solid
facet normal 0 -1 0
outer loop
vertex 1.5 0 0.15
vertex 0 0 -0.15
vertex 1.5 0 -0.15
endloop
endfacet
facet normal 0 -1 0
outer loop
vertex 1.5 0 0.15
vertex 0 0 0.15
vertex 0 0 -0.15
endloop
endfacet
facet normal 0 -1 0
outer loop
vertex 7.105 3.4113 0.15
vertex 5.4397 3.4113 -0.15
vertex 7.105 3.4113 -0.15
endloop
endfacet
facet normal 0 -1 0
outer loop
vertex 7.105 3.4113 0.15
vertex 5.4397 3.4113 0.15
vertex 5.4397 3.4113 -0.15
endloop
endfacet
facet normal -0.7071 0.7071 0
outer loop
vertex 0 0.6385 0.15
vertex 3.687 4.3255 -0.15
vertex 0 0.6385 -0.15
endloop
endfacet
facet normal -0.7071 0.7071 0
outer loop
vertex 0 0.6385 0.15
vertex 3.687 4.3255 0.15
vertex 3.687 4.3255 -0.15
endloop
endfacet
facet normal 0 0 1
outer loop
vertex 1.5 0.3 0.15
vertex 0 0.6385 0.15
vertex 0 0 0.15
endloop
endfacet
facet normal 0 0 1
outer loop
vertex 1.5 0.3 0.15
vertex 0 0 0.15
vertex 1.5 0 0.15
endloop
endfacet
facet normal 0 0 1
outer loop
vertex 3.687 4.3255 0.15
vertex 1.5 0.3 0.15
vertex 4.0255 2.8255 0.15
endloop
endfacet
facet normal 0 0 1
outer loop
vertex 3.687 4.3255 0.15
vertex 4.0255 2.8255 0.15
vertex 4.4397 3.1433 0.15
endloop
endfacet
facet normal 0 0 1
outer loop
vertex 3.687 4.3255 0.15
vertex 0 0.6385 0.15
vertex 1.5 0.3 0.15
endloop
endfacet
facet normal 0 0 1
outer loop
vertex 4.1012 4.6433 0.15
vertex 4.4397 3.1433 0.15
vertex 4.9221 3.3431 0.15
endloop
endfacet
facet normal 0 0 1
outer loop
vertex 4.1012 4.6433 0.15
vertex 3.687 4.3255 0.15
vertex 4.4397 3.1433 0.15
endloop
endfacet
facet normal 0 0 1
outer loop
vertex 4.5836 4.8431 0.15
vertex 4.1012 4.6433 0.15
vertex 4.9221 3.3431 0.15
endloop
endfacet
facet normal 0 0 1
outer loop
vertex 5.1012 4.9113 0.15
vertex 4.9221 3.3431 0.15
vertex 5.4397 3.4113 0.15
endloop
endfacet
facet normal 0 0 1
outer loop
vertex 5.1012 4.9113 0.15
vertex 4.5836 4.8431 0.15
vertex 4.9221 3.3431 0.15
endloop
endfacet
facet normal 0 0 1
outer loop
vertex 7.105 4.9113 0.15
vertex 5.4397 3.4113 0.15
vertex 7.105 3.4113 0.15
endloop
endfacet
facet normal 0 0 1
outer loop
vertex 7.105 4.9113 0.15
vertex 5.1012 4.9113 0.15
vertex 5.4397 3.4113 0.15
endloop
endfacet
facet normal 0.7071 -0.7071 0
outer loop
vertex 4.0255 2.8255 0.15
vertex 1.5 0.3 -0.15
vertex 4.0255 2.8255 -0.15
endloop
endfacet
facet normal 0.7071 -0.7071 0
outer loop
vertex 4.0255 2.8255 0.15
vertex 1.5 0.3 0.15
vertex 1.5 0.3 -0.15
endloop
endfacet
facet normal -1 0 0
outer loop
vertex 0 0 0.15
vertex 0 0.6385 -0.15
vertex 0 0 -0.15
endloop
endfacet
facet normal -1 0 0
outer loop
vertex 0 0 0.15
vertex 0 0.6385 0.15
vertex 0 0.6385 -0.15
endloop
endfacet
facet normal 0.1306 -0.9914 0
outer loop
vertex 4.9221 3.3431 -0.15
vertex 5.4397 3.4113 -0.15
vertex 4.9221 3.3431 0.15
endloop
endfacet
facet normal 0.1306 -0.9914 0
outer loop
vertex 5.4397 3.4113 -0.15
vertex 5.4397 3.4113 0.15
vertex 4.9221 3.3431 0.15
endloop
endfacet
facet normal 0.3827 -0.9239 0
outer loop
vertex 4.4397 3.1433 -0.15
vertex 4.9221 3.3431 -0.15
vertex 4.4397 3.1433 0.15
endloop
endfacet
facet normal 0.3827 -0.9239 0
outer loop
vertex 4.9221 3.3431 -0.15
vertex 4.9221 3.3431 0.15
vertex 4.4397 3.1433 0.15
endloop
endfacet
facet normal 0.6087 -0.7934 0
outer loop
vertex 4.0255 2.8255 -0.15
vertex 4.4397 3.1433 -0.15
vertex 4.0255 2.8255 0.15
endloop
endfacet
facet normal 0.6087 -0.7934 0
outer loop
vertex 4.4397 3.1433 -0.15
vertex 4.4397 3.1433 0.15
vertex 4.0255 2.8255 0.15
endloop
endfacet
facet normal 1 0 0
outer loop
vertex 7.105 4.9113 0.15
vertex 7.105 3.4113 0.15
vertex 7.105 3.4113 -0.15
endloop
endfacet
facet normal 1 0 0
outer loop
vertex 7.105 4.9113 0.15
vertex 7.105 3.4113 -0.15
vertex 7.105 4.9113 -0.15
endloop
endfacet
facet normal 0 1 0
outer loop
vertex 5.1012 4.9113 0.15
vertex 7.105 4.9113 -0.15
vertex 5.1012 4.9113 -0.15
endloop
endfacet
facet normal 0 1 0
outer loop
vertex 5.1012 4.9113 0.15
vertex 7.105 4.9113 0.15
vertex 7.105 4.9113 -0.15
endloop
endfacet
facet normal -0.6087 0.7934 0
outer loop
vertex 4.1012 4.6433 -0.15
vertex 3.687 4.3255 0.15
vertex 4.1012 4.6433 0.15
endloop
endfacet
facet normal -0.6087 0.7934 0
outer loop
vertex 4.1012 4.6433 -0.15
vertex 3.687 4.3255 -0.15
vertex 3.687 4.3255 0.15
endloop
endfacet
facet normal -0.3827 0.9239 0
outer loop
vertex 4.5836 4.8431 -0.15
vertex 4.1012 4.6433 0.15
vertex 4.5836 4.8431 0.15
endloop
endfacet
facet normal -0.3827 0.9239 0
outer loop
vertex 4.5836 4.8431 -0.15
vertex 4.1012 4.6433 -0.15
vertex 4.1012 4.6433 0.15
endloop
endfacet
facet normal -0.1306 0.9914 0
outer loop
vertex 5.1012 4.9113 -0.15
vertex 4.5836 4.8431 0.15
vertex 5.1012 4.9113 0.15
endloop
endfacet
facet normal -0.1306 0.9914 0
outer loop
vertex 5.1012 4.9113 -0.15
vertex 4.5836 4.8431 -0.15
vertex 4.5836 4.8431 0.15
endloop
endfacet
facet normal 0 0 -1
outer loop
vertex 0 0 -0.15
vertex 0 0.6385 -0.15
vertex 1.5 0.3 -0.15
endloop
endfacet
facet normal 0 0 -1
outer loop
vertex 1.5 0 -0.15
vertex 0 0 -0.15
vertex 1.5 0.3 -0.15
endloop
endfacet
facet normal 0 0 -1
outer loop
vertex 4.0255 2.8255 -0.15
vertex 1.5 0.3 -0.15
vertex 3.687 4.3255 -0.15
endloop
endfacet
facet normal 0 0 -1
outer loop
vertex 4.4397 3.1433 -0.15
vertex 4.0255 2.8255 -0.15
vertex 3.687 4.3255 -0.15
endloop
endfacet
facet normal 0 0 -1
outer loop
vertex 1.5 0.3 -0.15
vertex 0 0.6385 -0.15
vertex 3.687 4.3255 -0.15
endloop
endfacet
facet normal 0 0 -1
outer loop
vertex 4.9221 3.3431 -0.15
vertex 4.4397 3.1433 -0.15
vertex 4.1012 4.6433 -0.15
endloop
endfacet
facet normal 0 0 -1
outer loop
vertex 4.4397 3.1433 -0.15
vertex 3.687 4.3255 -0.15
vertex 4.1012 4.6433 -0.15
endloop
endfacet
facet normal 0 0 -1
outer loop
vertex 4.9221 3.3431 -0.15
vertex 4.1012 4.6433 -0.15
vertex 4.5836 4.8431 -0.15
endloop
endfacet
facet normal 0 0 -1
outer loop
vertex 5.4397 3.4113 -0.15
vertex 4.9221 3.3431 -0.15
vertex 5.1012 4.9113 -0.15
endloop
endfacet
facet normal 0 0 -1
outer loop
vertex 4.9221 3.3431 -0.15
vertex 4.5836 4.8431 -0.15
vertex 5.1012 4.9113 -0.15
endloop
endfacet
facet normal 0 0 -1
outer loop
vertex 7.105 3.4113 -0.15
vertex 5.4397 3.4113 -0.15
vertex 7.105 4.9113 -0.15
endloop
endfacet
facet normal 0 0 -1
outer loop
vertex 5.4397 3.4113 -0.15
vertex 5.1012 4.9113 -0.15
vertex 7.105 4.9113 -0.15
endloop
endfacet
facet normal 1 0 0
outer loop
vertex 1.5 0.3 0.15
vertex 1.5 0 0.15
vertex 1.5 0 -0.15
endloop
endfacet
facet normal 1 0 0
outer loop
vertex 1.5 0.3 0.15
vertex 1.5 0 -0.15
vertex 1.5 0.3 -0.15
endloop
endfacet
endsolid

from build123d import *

# Parameters (mm, degrees)
BOSS_EXTRUDE1_DEPTH = 0.15
FILLET1_R           = 2


with BuildPart() as part:
    # Sketch1 → Boss-Extrude1 (new, symmetric)
    with BuildSketch(Plane.XY):
        Polygon((0, 0), (1.5, 0), (1.5, 0.3), (4.611269837, 3.411269837), (7.105, 3.411269837), (7.105, 4.911269837), (4.272792206, 4.911269837), (0, 0.638477631), align=None)
    extrude(amount=BOSS_EXTRUDE1_DEPTH, both=True)

    # Fillet1
    fillet1_edges = [part.edges().sort_by_distance(p)[0] for p in [
        (4.272792206, 4.911269837, 0),
        (4.611269837, 3.411269837, 0),
    ]]
    fillet(fillet1_edges, radius=FILLET1_R)


solid = part.part
